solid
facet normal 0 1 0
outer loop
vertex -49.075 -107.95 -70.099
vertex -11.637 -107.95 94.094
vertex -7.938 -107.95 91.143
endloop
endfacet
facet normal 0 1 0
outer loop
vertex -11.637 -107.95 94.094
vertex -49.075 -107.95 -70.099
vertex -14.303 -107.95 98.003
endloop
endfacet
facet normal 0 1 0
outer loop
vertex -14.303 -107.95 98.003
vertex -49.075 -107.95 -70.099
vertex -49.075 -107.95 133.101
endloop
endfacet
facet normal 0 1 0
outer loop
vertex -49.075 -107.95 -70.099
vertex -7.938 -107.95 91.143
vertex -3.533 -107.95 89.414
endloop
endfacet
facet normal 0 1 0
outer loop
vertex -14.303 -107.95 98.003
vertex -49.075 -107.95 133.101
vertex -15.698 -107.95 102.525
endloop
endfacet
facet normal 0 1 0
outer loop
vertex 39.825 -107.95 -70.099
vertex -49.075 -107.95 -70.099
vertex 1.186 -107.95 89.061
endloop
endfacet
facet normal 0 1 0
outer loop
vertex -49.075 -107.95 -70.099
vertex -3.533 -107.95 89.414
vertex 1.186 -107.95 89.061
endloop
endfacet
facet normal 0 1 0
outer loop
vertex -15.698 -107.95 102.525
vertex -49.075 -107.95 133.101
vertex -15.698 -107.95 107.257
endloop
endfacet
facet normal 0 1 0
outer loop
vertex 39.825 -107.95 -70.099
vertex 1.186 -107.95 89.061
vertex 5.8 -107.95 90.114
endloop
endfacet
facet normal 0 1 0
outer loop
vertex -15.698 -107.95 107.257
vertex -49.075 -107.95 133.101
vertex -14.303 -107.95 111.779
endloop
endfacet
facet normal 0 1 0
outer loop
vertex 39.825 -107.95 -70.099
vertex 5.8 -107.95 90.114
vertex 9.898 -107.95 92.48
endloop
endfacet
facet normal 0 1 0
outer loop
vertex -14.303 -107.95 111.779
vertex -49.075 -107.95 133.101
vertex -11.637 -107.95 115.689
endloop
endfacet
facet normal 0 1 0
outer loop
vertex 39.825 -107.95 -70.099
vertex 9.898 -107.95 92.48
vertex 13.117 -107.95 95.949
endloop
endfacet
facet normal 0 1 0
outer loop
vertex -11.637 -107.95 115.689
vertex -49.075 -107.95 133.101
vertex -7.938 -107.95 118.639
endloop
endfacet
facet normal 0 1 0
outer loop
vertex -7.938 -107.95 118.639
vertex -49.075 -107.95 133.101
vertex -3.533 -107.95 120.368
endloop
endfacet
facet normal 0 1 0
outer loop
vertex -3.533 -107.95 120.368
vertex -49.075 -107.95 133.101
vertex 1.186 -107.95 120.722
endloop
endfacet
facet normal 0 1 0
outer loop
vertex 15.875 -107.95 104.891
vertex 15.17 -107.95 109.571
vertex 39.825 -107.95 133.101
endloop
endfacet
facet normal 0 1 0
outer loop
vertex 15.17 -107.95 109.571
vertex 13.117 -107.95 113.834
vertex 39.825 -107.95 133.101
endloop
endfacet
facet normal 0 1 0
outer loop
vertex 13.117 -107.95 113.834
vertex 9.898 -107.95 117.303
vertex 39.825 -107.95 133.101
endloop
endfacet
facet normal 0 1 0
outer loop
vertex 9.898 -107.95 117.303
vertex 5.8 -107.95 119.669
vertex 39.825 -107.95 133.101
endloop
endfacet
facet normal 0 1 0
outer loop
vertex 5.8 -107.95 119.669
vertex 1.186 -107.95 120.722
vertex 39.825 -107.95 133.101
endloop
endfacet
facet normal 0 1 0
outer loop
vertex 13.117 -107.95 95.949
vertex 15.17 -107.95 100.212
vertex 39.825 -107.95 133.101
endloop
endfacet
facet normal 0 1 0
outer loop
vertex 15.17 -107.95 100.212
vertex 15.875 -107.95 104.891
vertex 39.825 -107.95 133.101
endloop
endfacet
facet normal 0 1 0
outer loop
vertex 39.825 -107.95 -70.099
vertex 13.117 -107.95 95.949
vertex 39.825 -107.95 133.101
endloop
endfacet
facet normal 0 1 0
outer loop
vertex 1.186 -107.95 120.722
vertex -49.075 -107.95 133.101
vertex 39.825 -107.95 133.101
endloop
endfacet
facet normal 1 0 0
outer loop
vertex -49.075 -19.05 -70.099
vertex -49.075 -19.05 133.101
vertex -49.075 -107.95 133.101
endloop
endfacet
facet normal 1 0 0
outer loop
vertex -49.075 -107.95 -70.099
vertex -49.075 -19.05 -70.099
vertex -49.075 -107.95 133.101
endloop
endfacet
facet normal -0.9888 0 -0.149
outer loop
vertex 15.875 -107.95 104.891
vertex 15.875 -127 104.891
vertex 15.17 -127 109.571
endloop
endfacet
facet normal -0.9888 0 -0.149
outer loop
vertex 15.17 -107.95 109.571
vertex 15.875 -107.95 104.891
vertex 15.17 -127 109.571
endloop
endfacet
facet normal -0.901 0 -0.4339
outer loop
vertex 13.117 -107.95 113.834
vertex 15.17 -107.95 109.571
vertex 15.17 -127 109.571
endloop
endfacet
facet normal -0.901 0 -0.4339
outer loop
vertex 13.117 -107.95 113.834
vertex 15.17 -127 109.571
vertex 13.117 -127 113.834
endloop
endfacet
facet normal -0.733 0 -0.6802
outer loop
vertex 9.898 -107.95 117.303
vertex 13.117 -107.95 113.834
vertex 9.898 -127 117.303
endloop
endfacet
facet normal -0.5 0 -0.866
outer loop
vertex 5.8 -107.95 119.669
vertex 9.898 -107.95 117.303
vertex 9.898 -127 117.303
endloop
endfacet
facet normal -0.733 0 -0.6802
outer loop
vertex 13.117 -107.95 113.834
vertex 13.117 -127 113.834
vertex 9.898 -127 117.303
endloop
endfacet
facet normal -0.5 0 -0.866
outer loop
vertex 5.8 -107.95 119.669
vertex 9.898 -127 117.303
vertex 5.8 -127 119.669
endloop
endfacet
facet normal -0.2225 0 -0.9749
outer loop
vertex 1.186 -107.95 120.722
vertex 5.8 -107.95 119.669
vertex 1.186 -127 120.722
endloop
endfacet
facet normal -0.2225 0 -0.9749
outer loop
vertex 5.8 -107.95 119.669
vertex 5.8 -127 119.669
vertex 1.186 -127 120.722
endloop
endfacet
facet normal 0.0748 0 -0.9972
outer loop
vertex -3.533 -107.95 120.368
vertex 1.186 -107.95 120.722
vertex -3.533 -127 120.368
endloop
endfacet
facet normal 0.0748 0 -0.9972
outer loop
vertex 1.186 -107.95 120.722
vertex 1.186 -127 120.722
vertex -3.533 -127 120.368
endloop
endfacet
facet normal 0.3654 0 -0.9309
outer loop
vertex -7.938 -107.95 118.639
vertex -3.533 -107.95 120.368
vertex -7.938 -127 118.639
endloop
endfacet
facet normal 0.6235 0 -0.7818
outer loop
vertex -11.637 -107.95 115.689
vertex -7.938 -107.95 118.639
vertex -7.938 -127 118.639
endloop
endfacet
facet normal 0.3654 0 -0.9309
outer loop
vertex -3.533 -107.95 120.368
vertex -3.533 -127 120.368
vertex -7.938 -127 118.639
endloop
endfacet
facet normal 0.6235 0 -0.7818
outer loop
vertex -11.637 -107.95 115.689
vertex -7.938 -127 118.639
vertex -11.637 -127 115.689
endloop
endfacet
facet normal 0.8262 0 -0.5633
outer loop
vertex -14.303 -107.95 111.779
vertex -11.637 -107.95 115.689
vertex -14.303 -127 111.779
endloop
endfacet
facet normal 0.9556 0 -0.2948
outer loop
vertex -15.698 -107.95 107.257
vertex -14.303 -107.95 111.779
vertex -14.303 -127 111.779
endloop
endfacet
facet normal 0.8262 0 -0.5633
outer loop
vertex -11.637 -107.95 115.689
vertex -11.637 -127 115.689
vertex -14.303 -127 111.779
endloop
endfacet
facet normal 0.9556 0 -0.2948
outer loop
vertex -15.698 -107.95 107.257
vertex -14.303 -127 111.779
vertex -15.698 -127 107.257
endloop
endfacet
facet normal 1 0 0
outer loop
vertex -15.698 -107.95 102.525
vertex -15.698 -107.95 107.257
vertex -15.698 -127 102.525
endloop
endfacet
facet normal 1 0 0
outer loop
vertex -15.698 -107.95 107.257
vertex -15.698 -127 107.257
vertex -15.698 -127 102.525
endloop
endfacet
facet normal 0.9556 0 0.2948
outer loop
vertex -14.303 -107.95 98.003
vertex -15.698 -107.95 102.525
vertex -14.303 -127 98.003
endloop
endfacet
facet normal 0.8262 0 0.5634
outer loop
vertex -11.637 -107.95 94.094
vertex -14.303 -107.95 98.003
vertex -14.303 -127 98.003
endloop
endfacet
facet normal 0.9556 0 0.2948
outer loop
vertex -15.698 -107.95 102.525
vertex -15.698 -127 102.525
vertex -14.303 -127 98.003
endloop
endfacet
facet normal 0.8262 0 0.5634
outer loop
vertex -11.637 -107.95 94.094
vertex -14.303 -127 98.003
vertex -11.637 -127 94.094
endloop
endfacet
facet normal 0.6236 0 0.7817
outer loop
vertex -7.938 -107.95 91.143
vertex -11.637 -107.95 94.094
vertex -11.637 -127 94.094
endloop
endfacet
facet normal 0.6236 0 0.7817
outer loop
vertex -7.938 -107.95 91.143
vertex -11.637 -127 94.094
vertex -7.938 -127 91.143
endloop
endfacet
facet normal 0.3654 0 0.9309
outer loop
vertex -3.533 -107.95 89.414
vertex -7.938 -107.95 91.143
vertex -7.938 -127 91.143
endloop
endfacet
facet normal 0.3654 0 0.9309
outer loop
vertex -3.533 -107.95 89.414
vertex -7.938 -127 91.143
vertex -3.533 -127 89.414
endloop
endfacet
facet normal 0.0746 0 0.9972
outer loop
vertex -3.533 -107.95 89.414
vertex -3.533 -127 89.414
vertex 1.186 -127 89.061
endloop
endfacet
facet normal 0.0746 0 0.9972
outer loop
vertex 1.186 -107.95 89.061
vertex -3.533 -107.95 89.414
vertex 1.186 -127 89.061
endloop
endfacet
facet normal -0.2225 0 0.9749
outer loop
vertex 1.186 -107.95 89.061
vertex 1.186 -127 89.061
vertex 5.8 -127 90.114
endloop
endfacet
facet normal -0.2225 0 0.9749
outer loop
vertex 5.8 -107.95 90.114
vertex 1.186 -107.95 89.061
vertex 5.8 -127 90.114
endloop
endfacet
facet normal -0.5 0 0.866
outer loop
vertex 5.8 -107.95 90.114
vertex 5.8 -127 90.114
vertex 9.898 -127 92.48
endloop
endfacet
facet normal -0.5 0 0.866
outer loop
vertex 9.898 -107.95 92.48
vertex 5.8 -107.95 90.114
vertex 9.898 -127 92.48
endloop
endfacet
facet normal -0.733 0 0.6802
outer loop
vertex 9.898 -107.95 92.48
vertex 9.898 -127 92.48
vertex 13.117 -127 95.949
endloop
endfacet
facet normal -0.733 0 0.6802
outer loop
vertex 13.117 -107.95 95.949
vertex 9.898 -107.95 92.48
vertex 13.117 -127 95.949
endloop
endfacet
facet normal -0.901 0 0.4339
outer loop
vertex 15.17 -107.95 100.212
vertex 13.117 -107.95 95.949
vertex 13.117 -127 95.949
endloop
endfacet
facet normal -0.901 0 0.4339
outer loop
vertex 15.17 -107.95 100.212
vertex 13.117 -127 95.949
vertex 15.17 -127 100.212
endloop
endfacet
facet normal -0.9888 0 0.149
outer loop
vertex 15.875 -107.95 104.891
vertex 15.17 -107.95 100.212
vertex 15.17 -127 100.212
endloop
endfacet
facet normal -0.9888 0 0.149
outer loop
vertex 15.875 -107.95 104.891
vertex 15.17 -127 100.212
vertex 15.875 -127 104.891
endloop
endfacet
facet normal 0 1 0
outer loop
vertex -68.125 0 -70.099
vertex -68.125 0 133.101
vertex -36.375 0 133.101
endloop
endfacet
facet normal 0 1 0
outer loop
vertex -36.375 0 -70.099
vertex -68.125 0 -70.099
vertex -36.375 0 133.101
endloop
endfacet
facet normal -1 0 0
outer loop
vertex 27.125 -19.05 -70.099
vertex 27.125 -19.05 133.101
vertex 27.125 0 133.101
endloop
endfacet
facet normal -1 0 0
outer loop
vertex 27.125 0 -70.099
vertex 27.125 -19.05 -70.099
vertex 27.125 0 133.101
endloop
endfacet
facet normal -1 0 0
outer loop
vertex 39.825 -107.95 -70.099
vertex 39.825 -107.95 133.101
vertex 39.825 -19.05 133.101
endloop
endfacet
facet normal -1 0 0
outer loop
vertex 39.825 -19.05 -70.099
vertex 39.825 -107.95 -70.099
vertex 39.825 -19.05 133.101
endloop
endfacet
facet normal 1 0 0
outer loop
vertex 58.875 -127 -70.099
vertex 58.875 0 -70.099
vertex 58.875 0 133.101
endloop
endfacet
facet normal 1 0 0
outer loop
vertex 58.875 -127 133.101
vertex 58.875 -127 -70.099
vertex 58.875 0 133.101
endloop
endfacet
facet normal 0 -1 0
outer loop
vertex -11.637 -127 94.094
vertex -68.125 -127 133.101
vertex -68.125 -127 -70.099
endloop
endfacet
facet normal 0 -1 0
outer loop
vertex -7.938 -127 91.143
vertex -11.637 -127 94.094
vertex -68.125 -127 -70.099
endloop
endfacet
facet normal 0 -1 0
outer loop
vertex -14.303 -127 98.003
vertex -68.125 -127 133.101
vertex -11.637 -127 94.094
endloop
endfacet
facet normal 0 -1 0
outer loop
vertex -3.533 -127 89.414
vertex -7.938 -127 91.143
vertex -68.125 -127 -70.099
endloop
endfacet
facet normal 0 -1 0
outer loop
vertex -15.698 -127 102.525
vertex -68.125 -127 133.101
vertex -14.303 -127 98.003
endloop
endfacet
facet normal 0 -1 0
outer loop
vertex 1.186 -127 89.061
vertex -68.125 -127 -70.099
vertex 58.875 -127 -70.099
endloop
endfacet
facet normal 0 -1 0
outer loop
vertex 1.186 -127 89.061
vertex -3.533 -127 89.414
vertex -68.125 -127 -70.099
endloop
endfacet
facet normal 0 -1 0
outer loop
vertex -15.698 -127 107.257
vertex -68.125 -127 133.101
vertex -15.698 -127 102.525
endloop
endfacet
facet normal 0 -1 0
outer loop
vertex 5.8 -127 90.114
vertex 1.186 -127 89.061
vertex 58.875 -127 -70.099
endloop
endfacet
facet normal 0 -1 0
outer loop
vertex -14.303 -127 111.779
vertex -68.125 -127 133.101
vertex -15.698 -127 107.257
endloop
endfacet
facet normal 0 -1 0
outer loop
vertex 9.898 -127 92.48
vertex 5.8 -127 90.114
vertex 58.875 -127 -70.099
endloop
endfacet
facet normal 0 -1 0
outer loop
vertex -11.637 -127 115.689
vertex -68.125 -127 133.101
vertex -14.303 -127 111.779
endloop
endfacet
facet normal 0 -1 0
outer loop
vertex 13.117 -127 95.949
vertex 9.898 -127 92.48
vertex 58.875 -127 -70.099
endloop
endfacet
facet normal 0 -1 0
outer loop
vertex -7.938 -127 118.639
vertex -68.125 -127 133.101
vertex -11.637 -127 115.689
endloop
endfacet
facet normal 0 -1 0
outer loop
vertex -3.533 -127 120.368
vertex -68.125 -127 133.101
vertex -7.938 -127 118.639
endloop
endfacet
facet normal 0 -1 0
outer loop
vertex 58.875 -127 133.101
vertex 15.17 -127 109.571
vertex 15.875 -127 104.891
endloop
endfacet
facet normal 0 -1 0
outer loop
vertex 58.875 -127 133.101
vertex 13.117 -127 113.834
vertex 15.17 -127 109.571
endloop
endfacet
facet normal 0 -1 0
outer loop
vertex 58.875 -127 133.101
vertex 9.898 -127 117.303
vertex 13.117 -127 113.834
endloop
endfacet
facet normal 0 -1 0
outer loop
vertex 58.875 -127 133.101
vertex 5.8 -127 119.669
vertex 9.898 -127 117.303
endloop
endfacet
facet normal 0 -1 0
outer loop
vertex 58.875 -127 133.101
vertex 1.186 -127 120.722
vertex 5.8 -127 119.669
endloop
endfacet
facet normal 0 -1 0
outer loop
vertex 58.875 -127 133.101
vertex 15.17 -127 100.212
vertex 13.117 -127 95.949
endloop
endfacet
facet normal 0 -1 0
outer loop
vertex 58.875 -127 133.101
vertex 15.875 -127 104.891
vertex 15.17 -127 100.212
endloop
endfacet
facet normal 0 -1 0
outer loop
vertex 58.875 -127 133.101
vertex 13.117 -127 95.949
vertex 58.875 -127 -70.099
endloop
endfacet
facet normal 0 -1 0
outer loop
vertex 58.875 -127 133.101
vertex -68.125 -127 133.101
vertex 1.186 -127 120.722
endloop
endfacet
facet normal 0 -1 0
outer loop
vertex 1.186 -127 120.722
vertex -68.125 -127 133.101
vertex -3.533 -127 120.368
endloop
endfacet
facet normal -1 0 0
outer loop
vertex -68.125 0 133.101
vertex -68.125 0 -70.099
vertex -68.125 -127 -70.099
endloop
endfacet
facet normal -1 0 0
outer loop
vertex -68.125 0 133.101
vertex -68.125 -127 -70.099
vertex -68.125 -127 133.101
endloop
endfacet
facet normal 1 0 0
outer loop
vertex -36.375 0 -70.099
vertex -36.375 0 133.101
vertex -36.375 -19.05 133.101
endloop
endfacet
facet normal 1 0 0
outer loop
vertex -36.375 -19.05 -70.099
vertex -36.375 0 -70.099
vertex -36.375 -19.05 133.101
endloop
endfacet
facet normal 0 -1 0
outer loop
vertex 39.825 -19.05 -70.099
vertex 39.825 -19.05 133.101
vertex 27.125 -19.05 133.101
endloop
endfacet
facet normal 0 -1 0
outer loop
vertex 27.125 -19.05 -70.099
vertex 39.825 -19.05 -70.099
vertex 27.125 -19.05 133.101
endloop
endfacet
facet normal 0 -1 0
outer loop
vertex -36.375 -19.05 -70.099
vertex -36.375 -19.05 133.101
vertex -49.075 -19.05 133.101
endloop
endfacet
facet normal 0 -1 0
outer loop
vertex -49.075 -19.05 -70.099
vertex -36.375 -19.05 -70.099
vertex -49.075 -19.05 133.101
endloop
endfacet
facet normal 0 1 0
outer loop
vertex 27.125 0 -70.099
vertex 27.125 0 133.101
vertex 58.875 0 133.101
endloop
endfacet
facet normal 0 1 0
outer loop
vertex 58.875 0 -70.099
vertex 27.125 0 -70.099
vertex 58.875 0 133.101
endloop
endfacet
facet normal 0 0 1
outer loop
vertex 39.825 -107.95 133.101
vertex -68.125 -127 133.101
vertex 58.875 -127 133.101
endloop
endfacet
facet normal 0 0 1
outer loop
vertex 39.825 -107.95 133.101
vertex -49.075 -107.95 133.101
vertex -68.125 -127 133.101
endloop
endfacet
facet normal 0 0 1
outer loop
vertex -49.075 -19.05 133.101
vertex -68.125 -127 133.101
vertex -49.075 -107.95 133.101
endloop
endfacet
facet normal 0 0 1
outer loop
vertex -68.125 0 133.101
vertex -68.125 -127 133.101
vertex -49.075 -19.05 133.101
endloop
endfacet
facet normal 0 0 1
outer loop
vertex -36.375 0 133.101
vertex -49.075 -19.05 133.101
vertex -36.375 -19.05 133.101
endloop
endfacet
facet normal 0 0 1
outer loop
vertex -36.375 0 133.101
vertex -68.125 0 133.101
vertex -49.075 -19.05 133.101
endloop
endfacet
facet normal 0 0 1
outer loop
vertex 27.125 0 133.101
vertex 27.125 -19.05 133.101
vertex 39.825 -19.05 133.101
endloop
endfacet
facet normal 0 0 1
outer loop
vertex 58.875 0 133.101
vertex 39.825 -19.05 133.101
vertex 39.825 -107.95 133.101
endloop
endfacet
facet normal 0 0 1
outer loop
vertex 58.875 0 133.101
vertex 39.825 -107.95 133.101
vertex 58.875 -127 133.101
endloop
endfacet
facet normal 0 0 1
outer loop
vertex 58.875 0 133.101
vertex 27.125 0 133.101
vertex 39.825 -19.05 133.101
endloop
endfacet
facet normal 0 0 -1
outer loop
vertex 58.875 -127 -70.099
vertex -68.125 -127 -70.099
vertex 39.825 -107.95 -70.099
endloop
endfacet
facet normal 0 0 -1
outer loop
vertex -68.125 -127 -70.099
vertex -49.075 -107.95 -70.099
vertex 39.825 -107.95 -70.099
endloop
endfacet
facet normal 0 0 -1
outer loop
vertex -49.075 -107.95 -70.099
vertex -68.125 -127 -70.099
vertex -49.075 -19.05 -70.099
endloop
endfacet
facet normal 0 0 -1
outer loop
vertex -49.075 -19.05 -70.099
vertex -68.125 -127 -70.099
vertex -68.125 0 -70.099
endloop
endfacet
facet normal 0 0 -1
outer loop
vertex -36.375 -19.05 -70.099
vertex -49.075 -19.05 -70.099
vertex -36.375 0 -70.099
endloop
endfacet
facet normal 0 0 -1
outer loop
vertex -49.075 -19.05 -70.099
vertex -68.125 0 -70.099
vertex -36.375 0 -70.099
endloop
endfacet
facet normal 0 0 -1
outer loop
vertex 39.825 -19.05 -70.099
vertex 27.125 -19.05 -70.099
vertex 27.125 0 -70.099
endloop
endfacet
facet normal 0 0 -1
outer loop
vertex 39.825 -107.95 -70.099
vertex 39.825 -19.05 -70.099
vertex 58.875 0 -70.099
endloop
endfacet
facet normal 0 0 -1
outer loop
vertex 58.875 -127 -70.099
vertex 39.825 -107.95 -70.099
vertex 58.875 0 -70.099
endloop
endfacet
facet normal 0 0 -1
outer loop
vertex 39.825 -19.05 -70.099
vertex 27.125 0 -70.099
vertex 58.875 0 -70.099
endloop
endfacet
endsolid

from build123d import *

# Parameters (mm, degrees)
F0_W     = 127
F0_H     = 203.2
F1_DEPTH = 127
F3_DEPTH = 203.2
F4_R     = 15.875
F5_DEPTH = 25.4


with BuildPart() as f1:
    # F0 (on Front) → F1 (new body)
    with BuildSketch(Plane.XZ):
        with Locations((-4.624575, 31.5007)):
            Rectangle(F0_W, F0_H)
    extrude(amount=F1_DEPTH)

    # F2 (on face) → F3 (cut)
    with BuildSketch(Plane.XY.offset(133.1007)):
        Polygon((-49.074575, -107.95), (39.825425, -107.95), (39.825425, -19.05), (27.125425, -19.05), (27.125425, 0), (-36.374575, 0), (-36.374575, -19.05), (-49.074575, -19.05), align=None)
    extrude(amount=-F3_DEPTH, mode=Mode.SUBTRACT)

    # F4 (on face) → F5 (cut)
    with BuildSketch(Plane.XZ.offset(127)):
        with Locations((0, 104.891345)):
            Circle(F4_R)
    extrude(amount=-F5_DEPTH, mode=Mode.SUBTRACT)


solid = f1.part
